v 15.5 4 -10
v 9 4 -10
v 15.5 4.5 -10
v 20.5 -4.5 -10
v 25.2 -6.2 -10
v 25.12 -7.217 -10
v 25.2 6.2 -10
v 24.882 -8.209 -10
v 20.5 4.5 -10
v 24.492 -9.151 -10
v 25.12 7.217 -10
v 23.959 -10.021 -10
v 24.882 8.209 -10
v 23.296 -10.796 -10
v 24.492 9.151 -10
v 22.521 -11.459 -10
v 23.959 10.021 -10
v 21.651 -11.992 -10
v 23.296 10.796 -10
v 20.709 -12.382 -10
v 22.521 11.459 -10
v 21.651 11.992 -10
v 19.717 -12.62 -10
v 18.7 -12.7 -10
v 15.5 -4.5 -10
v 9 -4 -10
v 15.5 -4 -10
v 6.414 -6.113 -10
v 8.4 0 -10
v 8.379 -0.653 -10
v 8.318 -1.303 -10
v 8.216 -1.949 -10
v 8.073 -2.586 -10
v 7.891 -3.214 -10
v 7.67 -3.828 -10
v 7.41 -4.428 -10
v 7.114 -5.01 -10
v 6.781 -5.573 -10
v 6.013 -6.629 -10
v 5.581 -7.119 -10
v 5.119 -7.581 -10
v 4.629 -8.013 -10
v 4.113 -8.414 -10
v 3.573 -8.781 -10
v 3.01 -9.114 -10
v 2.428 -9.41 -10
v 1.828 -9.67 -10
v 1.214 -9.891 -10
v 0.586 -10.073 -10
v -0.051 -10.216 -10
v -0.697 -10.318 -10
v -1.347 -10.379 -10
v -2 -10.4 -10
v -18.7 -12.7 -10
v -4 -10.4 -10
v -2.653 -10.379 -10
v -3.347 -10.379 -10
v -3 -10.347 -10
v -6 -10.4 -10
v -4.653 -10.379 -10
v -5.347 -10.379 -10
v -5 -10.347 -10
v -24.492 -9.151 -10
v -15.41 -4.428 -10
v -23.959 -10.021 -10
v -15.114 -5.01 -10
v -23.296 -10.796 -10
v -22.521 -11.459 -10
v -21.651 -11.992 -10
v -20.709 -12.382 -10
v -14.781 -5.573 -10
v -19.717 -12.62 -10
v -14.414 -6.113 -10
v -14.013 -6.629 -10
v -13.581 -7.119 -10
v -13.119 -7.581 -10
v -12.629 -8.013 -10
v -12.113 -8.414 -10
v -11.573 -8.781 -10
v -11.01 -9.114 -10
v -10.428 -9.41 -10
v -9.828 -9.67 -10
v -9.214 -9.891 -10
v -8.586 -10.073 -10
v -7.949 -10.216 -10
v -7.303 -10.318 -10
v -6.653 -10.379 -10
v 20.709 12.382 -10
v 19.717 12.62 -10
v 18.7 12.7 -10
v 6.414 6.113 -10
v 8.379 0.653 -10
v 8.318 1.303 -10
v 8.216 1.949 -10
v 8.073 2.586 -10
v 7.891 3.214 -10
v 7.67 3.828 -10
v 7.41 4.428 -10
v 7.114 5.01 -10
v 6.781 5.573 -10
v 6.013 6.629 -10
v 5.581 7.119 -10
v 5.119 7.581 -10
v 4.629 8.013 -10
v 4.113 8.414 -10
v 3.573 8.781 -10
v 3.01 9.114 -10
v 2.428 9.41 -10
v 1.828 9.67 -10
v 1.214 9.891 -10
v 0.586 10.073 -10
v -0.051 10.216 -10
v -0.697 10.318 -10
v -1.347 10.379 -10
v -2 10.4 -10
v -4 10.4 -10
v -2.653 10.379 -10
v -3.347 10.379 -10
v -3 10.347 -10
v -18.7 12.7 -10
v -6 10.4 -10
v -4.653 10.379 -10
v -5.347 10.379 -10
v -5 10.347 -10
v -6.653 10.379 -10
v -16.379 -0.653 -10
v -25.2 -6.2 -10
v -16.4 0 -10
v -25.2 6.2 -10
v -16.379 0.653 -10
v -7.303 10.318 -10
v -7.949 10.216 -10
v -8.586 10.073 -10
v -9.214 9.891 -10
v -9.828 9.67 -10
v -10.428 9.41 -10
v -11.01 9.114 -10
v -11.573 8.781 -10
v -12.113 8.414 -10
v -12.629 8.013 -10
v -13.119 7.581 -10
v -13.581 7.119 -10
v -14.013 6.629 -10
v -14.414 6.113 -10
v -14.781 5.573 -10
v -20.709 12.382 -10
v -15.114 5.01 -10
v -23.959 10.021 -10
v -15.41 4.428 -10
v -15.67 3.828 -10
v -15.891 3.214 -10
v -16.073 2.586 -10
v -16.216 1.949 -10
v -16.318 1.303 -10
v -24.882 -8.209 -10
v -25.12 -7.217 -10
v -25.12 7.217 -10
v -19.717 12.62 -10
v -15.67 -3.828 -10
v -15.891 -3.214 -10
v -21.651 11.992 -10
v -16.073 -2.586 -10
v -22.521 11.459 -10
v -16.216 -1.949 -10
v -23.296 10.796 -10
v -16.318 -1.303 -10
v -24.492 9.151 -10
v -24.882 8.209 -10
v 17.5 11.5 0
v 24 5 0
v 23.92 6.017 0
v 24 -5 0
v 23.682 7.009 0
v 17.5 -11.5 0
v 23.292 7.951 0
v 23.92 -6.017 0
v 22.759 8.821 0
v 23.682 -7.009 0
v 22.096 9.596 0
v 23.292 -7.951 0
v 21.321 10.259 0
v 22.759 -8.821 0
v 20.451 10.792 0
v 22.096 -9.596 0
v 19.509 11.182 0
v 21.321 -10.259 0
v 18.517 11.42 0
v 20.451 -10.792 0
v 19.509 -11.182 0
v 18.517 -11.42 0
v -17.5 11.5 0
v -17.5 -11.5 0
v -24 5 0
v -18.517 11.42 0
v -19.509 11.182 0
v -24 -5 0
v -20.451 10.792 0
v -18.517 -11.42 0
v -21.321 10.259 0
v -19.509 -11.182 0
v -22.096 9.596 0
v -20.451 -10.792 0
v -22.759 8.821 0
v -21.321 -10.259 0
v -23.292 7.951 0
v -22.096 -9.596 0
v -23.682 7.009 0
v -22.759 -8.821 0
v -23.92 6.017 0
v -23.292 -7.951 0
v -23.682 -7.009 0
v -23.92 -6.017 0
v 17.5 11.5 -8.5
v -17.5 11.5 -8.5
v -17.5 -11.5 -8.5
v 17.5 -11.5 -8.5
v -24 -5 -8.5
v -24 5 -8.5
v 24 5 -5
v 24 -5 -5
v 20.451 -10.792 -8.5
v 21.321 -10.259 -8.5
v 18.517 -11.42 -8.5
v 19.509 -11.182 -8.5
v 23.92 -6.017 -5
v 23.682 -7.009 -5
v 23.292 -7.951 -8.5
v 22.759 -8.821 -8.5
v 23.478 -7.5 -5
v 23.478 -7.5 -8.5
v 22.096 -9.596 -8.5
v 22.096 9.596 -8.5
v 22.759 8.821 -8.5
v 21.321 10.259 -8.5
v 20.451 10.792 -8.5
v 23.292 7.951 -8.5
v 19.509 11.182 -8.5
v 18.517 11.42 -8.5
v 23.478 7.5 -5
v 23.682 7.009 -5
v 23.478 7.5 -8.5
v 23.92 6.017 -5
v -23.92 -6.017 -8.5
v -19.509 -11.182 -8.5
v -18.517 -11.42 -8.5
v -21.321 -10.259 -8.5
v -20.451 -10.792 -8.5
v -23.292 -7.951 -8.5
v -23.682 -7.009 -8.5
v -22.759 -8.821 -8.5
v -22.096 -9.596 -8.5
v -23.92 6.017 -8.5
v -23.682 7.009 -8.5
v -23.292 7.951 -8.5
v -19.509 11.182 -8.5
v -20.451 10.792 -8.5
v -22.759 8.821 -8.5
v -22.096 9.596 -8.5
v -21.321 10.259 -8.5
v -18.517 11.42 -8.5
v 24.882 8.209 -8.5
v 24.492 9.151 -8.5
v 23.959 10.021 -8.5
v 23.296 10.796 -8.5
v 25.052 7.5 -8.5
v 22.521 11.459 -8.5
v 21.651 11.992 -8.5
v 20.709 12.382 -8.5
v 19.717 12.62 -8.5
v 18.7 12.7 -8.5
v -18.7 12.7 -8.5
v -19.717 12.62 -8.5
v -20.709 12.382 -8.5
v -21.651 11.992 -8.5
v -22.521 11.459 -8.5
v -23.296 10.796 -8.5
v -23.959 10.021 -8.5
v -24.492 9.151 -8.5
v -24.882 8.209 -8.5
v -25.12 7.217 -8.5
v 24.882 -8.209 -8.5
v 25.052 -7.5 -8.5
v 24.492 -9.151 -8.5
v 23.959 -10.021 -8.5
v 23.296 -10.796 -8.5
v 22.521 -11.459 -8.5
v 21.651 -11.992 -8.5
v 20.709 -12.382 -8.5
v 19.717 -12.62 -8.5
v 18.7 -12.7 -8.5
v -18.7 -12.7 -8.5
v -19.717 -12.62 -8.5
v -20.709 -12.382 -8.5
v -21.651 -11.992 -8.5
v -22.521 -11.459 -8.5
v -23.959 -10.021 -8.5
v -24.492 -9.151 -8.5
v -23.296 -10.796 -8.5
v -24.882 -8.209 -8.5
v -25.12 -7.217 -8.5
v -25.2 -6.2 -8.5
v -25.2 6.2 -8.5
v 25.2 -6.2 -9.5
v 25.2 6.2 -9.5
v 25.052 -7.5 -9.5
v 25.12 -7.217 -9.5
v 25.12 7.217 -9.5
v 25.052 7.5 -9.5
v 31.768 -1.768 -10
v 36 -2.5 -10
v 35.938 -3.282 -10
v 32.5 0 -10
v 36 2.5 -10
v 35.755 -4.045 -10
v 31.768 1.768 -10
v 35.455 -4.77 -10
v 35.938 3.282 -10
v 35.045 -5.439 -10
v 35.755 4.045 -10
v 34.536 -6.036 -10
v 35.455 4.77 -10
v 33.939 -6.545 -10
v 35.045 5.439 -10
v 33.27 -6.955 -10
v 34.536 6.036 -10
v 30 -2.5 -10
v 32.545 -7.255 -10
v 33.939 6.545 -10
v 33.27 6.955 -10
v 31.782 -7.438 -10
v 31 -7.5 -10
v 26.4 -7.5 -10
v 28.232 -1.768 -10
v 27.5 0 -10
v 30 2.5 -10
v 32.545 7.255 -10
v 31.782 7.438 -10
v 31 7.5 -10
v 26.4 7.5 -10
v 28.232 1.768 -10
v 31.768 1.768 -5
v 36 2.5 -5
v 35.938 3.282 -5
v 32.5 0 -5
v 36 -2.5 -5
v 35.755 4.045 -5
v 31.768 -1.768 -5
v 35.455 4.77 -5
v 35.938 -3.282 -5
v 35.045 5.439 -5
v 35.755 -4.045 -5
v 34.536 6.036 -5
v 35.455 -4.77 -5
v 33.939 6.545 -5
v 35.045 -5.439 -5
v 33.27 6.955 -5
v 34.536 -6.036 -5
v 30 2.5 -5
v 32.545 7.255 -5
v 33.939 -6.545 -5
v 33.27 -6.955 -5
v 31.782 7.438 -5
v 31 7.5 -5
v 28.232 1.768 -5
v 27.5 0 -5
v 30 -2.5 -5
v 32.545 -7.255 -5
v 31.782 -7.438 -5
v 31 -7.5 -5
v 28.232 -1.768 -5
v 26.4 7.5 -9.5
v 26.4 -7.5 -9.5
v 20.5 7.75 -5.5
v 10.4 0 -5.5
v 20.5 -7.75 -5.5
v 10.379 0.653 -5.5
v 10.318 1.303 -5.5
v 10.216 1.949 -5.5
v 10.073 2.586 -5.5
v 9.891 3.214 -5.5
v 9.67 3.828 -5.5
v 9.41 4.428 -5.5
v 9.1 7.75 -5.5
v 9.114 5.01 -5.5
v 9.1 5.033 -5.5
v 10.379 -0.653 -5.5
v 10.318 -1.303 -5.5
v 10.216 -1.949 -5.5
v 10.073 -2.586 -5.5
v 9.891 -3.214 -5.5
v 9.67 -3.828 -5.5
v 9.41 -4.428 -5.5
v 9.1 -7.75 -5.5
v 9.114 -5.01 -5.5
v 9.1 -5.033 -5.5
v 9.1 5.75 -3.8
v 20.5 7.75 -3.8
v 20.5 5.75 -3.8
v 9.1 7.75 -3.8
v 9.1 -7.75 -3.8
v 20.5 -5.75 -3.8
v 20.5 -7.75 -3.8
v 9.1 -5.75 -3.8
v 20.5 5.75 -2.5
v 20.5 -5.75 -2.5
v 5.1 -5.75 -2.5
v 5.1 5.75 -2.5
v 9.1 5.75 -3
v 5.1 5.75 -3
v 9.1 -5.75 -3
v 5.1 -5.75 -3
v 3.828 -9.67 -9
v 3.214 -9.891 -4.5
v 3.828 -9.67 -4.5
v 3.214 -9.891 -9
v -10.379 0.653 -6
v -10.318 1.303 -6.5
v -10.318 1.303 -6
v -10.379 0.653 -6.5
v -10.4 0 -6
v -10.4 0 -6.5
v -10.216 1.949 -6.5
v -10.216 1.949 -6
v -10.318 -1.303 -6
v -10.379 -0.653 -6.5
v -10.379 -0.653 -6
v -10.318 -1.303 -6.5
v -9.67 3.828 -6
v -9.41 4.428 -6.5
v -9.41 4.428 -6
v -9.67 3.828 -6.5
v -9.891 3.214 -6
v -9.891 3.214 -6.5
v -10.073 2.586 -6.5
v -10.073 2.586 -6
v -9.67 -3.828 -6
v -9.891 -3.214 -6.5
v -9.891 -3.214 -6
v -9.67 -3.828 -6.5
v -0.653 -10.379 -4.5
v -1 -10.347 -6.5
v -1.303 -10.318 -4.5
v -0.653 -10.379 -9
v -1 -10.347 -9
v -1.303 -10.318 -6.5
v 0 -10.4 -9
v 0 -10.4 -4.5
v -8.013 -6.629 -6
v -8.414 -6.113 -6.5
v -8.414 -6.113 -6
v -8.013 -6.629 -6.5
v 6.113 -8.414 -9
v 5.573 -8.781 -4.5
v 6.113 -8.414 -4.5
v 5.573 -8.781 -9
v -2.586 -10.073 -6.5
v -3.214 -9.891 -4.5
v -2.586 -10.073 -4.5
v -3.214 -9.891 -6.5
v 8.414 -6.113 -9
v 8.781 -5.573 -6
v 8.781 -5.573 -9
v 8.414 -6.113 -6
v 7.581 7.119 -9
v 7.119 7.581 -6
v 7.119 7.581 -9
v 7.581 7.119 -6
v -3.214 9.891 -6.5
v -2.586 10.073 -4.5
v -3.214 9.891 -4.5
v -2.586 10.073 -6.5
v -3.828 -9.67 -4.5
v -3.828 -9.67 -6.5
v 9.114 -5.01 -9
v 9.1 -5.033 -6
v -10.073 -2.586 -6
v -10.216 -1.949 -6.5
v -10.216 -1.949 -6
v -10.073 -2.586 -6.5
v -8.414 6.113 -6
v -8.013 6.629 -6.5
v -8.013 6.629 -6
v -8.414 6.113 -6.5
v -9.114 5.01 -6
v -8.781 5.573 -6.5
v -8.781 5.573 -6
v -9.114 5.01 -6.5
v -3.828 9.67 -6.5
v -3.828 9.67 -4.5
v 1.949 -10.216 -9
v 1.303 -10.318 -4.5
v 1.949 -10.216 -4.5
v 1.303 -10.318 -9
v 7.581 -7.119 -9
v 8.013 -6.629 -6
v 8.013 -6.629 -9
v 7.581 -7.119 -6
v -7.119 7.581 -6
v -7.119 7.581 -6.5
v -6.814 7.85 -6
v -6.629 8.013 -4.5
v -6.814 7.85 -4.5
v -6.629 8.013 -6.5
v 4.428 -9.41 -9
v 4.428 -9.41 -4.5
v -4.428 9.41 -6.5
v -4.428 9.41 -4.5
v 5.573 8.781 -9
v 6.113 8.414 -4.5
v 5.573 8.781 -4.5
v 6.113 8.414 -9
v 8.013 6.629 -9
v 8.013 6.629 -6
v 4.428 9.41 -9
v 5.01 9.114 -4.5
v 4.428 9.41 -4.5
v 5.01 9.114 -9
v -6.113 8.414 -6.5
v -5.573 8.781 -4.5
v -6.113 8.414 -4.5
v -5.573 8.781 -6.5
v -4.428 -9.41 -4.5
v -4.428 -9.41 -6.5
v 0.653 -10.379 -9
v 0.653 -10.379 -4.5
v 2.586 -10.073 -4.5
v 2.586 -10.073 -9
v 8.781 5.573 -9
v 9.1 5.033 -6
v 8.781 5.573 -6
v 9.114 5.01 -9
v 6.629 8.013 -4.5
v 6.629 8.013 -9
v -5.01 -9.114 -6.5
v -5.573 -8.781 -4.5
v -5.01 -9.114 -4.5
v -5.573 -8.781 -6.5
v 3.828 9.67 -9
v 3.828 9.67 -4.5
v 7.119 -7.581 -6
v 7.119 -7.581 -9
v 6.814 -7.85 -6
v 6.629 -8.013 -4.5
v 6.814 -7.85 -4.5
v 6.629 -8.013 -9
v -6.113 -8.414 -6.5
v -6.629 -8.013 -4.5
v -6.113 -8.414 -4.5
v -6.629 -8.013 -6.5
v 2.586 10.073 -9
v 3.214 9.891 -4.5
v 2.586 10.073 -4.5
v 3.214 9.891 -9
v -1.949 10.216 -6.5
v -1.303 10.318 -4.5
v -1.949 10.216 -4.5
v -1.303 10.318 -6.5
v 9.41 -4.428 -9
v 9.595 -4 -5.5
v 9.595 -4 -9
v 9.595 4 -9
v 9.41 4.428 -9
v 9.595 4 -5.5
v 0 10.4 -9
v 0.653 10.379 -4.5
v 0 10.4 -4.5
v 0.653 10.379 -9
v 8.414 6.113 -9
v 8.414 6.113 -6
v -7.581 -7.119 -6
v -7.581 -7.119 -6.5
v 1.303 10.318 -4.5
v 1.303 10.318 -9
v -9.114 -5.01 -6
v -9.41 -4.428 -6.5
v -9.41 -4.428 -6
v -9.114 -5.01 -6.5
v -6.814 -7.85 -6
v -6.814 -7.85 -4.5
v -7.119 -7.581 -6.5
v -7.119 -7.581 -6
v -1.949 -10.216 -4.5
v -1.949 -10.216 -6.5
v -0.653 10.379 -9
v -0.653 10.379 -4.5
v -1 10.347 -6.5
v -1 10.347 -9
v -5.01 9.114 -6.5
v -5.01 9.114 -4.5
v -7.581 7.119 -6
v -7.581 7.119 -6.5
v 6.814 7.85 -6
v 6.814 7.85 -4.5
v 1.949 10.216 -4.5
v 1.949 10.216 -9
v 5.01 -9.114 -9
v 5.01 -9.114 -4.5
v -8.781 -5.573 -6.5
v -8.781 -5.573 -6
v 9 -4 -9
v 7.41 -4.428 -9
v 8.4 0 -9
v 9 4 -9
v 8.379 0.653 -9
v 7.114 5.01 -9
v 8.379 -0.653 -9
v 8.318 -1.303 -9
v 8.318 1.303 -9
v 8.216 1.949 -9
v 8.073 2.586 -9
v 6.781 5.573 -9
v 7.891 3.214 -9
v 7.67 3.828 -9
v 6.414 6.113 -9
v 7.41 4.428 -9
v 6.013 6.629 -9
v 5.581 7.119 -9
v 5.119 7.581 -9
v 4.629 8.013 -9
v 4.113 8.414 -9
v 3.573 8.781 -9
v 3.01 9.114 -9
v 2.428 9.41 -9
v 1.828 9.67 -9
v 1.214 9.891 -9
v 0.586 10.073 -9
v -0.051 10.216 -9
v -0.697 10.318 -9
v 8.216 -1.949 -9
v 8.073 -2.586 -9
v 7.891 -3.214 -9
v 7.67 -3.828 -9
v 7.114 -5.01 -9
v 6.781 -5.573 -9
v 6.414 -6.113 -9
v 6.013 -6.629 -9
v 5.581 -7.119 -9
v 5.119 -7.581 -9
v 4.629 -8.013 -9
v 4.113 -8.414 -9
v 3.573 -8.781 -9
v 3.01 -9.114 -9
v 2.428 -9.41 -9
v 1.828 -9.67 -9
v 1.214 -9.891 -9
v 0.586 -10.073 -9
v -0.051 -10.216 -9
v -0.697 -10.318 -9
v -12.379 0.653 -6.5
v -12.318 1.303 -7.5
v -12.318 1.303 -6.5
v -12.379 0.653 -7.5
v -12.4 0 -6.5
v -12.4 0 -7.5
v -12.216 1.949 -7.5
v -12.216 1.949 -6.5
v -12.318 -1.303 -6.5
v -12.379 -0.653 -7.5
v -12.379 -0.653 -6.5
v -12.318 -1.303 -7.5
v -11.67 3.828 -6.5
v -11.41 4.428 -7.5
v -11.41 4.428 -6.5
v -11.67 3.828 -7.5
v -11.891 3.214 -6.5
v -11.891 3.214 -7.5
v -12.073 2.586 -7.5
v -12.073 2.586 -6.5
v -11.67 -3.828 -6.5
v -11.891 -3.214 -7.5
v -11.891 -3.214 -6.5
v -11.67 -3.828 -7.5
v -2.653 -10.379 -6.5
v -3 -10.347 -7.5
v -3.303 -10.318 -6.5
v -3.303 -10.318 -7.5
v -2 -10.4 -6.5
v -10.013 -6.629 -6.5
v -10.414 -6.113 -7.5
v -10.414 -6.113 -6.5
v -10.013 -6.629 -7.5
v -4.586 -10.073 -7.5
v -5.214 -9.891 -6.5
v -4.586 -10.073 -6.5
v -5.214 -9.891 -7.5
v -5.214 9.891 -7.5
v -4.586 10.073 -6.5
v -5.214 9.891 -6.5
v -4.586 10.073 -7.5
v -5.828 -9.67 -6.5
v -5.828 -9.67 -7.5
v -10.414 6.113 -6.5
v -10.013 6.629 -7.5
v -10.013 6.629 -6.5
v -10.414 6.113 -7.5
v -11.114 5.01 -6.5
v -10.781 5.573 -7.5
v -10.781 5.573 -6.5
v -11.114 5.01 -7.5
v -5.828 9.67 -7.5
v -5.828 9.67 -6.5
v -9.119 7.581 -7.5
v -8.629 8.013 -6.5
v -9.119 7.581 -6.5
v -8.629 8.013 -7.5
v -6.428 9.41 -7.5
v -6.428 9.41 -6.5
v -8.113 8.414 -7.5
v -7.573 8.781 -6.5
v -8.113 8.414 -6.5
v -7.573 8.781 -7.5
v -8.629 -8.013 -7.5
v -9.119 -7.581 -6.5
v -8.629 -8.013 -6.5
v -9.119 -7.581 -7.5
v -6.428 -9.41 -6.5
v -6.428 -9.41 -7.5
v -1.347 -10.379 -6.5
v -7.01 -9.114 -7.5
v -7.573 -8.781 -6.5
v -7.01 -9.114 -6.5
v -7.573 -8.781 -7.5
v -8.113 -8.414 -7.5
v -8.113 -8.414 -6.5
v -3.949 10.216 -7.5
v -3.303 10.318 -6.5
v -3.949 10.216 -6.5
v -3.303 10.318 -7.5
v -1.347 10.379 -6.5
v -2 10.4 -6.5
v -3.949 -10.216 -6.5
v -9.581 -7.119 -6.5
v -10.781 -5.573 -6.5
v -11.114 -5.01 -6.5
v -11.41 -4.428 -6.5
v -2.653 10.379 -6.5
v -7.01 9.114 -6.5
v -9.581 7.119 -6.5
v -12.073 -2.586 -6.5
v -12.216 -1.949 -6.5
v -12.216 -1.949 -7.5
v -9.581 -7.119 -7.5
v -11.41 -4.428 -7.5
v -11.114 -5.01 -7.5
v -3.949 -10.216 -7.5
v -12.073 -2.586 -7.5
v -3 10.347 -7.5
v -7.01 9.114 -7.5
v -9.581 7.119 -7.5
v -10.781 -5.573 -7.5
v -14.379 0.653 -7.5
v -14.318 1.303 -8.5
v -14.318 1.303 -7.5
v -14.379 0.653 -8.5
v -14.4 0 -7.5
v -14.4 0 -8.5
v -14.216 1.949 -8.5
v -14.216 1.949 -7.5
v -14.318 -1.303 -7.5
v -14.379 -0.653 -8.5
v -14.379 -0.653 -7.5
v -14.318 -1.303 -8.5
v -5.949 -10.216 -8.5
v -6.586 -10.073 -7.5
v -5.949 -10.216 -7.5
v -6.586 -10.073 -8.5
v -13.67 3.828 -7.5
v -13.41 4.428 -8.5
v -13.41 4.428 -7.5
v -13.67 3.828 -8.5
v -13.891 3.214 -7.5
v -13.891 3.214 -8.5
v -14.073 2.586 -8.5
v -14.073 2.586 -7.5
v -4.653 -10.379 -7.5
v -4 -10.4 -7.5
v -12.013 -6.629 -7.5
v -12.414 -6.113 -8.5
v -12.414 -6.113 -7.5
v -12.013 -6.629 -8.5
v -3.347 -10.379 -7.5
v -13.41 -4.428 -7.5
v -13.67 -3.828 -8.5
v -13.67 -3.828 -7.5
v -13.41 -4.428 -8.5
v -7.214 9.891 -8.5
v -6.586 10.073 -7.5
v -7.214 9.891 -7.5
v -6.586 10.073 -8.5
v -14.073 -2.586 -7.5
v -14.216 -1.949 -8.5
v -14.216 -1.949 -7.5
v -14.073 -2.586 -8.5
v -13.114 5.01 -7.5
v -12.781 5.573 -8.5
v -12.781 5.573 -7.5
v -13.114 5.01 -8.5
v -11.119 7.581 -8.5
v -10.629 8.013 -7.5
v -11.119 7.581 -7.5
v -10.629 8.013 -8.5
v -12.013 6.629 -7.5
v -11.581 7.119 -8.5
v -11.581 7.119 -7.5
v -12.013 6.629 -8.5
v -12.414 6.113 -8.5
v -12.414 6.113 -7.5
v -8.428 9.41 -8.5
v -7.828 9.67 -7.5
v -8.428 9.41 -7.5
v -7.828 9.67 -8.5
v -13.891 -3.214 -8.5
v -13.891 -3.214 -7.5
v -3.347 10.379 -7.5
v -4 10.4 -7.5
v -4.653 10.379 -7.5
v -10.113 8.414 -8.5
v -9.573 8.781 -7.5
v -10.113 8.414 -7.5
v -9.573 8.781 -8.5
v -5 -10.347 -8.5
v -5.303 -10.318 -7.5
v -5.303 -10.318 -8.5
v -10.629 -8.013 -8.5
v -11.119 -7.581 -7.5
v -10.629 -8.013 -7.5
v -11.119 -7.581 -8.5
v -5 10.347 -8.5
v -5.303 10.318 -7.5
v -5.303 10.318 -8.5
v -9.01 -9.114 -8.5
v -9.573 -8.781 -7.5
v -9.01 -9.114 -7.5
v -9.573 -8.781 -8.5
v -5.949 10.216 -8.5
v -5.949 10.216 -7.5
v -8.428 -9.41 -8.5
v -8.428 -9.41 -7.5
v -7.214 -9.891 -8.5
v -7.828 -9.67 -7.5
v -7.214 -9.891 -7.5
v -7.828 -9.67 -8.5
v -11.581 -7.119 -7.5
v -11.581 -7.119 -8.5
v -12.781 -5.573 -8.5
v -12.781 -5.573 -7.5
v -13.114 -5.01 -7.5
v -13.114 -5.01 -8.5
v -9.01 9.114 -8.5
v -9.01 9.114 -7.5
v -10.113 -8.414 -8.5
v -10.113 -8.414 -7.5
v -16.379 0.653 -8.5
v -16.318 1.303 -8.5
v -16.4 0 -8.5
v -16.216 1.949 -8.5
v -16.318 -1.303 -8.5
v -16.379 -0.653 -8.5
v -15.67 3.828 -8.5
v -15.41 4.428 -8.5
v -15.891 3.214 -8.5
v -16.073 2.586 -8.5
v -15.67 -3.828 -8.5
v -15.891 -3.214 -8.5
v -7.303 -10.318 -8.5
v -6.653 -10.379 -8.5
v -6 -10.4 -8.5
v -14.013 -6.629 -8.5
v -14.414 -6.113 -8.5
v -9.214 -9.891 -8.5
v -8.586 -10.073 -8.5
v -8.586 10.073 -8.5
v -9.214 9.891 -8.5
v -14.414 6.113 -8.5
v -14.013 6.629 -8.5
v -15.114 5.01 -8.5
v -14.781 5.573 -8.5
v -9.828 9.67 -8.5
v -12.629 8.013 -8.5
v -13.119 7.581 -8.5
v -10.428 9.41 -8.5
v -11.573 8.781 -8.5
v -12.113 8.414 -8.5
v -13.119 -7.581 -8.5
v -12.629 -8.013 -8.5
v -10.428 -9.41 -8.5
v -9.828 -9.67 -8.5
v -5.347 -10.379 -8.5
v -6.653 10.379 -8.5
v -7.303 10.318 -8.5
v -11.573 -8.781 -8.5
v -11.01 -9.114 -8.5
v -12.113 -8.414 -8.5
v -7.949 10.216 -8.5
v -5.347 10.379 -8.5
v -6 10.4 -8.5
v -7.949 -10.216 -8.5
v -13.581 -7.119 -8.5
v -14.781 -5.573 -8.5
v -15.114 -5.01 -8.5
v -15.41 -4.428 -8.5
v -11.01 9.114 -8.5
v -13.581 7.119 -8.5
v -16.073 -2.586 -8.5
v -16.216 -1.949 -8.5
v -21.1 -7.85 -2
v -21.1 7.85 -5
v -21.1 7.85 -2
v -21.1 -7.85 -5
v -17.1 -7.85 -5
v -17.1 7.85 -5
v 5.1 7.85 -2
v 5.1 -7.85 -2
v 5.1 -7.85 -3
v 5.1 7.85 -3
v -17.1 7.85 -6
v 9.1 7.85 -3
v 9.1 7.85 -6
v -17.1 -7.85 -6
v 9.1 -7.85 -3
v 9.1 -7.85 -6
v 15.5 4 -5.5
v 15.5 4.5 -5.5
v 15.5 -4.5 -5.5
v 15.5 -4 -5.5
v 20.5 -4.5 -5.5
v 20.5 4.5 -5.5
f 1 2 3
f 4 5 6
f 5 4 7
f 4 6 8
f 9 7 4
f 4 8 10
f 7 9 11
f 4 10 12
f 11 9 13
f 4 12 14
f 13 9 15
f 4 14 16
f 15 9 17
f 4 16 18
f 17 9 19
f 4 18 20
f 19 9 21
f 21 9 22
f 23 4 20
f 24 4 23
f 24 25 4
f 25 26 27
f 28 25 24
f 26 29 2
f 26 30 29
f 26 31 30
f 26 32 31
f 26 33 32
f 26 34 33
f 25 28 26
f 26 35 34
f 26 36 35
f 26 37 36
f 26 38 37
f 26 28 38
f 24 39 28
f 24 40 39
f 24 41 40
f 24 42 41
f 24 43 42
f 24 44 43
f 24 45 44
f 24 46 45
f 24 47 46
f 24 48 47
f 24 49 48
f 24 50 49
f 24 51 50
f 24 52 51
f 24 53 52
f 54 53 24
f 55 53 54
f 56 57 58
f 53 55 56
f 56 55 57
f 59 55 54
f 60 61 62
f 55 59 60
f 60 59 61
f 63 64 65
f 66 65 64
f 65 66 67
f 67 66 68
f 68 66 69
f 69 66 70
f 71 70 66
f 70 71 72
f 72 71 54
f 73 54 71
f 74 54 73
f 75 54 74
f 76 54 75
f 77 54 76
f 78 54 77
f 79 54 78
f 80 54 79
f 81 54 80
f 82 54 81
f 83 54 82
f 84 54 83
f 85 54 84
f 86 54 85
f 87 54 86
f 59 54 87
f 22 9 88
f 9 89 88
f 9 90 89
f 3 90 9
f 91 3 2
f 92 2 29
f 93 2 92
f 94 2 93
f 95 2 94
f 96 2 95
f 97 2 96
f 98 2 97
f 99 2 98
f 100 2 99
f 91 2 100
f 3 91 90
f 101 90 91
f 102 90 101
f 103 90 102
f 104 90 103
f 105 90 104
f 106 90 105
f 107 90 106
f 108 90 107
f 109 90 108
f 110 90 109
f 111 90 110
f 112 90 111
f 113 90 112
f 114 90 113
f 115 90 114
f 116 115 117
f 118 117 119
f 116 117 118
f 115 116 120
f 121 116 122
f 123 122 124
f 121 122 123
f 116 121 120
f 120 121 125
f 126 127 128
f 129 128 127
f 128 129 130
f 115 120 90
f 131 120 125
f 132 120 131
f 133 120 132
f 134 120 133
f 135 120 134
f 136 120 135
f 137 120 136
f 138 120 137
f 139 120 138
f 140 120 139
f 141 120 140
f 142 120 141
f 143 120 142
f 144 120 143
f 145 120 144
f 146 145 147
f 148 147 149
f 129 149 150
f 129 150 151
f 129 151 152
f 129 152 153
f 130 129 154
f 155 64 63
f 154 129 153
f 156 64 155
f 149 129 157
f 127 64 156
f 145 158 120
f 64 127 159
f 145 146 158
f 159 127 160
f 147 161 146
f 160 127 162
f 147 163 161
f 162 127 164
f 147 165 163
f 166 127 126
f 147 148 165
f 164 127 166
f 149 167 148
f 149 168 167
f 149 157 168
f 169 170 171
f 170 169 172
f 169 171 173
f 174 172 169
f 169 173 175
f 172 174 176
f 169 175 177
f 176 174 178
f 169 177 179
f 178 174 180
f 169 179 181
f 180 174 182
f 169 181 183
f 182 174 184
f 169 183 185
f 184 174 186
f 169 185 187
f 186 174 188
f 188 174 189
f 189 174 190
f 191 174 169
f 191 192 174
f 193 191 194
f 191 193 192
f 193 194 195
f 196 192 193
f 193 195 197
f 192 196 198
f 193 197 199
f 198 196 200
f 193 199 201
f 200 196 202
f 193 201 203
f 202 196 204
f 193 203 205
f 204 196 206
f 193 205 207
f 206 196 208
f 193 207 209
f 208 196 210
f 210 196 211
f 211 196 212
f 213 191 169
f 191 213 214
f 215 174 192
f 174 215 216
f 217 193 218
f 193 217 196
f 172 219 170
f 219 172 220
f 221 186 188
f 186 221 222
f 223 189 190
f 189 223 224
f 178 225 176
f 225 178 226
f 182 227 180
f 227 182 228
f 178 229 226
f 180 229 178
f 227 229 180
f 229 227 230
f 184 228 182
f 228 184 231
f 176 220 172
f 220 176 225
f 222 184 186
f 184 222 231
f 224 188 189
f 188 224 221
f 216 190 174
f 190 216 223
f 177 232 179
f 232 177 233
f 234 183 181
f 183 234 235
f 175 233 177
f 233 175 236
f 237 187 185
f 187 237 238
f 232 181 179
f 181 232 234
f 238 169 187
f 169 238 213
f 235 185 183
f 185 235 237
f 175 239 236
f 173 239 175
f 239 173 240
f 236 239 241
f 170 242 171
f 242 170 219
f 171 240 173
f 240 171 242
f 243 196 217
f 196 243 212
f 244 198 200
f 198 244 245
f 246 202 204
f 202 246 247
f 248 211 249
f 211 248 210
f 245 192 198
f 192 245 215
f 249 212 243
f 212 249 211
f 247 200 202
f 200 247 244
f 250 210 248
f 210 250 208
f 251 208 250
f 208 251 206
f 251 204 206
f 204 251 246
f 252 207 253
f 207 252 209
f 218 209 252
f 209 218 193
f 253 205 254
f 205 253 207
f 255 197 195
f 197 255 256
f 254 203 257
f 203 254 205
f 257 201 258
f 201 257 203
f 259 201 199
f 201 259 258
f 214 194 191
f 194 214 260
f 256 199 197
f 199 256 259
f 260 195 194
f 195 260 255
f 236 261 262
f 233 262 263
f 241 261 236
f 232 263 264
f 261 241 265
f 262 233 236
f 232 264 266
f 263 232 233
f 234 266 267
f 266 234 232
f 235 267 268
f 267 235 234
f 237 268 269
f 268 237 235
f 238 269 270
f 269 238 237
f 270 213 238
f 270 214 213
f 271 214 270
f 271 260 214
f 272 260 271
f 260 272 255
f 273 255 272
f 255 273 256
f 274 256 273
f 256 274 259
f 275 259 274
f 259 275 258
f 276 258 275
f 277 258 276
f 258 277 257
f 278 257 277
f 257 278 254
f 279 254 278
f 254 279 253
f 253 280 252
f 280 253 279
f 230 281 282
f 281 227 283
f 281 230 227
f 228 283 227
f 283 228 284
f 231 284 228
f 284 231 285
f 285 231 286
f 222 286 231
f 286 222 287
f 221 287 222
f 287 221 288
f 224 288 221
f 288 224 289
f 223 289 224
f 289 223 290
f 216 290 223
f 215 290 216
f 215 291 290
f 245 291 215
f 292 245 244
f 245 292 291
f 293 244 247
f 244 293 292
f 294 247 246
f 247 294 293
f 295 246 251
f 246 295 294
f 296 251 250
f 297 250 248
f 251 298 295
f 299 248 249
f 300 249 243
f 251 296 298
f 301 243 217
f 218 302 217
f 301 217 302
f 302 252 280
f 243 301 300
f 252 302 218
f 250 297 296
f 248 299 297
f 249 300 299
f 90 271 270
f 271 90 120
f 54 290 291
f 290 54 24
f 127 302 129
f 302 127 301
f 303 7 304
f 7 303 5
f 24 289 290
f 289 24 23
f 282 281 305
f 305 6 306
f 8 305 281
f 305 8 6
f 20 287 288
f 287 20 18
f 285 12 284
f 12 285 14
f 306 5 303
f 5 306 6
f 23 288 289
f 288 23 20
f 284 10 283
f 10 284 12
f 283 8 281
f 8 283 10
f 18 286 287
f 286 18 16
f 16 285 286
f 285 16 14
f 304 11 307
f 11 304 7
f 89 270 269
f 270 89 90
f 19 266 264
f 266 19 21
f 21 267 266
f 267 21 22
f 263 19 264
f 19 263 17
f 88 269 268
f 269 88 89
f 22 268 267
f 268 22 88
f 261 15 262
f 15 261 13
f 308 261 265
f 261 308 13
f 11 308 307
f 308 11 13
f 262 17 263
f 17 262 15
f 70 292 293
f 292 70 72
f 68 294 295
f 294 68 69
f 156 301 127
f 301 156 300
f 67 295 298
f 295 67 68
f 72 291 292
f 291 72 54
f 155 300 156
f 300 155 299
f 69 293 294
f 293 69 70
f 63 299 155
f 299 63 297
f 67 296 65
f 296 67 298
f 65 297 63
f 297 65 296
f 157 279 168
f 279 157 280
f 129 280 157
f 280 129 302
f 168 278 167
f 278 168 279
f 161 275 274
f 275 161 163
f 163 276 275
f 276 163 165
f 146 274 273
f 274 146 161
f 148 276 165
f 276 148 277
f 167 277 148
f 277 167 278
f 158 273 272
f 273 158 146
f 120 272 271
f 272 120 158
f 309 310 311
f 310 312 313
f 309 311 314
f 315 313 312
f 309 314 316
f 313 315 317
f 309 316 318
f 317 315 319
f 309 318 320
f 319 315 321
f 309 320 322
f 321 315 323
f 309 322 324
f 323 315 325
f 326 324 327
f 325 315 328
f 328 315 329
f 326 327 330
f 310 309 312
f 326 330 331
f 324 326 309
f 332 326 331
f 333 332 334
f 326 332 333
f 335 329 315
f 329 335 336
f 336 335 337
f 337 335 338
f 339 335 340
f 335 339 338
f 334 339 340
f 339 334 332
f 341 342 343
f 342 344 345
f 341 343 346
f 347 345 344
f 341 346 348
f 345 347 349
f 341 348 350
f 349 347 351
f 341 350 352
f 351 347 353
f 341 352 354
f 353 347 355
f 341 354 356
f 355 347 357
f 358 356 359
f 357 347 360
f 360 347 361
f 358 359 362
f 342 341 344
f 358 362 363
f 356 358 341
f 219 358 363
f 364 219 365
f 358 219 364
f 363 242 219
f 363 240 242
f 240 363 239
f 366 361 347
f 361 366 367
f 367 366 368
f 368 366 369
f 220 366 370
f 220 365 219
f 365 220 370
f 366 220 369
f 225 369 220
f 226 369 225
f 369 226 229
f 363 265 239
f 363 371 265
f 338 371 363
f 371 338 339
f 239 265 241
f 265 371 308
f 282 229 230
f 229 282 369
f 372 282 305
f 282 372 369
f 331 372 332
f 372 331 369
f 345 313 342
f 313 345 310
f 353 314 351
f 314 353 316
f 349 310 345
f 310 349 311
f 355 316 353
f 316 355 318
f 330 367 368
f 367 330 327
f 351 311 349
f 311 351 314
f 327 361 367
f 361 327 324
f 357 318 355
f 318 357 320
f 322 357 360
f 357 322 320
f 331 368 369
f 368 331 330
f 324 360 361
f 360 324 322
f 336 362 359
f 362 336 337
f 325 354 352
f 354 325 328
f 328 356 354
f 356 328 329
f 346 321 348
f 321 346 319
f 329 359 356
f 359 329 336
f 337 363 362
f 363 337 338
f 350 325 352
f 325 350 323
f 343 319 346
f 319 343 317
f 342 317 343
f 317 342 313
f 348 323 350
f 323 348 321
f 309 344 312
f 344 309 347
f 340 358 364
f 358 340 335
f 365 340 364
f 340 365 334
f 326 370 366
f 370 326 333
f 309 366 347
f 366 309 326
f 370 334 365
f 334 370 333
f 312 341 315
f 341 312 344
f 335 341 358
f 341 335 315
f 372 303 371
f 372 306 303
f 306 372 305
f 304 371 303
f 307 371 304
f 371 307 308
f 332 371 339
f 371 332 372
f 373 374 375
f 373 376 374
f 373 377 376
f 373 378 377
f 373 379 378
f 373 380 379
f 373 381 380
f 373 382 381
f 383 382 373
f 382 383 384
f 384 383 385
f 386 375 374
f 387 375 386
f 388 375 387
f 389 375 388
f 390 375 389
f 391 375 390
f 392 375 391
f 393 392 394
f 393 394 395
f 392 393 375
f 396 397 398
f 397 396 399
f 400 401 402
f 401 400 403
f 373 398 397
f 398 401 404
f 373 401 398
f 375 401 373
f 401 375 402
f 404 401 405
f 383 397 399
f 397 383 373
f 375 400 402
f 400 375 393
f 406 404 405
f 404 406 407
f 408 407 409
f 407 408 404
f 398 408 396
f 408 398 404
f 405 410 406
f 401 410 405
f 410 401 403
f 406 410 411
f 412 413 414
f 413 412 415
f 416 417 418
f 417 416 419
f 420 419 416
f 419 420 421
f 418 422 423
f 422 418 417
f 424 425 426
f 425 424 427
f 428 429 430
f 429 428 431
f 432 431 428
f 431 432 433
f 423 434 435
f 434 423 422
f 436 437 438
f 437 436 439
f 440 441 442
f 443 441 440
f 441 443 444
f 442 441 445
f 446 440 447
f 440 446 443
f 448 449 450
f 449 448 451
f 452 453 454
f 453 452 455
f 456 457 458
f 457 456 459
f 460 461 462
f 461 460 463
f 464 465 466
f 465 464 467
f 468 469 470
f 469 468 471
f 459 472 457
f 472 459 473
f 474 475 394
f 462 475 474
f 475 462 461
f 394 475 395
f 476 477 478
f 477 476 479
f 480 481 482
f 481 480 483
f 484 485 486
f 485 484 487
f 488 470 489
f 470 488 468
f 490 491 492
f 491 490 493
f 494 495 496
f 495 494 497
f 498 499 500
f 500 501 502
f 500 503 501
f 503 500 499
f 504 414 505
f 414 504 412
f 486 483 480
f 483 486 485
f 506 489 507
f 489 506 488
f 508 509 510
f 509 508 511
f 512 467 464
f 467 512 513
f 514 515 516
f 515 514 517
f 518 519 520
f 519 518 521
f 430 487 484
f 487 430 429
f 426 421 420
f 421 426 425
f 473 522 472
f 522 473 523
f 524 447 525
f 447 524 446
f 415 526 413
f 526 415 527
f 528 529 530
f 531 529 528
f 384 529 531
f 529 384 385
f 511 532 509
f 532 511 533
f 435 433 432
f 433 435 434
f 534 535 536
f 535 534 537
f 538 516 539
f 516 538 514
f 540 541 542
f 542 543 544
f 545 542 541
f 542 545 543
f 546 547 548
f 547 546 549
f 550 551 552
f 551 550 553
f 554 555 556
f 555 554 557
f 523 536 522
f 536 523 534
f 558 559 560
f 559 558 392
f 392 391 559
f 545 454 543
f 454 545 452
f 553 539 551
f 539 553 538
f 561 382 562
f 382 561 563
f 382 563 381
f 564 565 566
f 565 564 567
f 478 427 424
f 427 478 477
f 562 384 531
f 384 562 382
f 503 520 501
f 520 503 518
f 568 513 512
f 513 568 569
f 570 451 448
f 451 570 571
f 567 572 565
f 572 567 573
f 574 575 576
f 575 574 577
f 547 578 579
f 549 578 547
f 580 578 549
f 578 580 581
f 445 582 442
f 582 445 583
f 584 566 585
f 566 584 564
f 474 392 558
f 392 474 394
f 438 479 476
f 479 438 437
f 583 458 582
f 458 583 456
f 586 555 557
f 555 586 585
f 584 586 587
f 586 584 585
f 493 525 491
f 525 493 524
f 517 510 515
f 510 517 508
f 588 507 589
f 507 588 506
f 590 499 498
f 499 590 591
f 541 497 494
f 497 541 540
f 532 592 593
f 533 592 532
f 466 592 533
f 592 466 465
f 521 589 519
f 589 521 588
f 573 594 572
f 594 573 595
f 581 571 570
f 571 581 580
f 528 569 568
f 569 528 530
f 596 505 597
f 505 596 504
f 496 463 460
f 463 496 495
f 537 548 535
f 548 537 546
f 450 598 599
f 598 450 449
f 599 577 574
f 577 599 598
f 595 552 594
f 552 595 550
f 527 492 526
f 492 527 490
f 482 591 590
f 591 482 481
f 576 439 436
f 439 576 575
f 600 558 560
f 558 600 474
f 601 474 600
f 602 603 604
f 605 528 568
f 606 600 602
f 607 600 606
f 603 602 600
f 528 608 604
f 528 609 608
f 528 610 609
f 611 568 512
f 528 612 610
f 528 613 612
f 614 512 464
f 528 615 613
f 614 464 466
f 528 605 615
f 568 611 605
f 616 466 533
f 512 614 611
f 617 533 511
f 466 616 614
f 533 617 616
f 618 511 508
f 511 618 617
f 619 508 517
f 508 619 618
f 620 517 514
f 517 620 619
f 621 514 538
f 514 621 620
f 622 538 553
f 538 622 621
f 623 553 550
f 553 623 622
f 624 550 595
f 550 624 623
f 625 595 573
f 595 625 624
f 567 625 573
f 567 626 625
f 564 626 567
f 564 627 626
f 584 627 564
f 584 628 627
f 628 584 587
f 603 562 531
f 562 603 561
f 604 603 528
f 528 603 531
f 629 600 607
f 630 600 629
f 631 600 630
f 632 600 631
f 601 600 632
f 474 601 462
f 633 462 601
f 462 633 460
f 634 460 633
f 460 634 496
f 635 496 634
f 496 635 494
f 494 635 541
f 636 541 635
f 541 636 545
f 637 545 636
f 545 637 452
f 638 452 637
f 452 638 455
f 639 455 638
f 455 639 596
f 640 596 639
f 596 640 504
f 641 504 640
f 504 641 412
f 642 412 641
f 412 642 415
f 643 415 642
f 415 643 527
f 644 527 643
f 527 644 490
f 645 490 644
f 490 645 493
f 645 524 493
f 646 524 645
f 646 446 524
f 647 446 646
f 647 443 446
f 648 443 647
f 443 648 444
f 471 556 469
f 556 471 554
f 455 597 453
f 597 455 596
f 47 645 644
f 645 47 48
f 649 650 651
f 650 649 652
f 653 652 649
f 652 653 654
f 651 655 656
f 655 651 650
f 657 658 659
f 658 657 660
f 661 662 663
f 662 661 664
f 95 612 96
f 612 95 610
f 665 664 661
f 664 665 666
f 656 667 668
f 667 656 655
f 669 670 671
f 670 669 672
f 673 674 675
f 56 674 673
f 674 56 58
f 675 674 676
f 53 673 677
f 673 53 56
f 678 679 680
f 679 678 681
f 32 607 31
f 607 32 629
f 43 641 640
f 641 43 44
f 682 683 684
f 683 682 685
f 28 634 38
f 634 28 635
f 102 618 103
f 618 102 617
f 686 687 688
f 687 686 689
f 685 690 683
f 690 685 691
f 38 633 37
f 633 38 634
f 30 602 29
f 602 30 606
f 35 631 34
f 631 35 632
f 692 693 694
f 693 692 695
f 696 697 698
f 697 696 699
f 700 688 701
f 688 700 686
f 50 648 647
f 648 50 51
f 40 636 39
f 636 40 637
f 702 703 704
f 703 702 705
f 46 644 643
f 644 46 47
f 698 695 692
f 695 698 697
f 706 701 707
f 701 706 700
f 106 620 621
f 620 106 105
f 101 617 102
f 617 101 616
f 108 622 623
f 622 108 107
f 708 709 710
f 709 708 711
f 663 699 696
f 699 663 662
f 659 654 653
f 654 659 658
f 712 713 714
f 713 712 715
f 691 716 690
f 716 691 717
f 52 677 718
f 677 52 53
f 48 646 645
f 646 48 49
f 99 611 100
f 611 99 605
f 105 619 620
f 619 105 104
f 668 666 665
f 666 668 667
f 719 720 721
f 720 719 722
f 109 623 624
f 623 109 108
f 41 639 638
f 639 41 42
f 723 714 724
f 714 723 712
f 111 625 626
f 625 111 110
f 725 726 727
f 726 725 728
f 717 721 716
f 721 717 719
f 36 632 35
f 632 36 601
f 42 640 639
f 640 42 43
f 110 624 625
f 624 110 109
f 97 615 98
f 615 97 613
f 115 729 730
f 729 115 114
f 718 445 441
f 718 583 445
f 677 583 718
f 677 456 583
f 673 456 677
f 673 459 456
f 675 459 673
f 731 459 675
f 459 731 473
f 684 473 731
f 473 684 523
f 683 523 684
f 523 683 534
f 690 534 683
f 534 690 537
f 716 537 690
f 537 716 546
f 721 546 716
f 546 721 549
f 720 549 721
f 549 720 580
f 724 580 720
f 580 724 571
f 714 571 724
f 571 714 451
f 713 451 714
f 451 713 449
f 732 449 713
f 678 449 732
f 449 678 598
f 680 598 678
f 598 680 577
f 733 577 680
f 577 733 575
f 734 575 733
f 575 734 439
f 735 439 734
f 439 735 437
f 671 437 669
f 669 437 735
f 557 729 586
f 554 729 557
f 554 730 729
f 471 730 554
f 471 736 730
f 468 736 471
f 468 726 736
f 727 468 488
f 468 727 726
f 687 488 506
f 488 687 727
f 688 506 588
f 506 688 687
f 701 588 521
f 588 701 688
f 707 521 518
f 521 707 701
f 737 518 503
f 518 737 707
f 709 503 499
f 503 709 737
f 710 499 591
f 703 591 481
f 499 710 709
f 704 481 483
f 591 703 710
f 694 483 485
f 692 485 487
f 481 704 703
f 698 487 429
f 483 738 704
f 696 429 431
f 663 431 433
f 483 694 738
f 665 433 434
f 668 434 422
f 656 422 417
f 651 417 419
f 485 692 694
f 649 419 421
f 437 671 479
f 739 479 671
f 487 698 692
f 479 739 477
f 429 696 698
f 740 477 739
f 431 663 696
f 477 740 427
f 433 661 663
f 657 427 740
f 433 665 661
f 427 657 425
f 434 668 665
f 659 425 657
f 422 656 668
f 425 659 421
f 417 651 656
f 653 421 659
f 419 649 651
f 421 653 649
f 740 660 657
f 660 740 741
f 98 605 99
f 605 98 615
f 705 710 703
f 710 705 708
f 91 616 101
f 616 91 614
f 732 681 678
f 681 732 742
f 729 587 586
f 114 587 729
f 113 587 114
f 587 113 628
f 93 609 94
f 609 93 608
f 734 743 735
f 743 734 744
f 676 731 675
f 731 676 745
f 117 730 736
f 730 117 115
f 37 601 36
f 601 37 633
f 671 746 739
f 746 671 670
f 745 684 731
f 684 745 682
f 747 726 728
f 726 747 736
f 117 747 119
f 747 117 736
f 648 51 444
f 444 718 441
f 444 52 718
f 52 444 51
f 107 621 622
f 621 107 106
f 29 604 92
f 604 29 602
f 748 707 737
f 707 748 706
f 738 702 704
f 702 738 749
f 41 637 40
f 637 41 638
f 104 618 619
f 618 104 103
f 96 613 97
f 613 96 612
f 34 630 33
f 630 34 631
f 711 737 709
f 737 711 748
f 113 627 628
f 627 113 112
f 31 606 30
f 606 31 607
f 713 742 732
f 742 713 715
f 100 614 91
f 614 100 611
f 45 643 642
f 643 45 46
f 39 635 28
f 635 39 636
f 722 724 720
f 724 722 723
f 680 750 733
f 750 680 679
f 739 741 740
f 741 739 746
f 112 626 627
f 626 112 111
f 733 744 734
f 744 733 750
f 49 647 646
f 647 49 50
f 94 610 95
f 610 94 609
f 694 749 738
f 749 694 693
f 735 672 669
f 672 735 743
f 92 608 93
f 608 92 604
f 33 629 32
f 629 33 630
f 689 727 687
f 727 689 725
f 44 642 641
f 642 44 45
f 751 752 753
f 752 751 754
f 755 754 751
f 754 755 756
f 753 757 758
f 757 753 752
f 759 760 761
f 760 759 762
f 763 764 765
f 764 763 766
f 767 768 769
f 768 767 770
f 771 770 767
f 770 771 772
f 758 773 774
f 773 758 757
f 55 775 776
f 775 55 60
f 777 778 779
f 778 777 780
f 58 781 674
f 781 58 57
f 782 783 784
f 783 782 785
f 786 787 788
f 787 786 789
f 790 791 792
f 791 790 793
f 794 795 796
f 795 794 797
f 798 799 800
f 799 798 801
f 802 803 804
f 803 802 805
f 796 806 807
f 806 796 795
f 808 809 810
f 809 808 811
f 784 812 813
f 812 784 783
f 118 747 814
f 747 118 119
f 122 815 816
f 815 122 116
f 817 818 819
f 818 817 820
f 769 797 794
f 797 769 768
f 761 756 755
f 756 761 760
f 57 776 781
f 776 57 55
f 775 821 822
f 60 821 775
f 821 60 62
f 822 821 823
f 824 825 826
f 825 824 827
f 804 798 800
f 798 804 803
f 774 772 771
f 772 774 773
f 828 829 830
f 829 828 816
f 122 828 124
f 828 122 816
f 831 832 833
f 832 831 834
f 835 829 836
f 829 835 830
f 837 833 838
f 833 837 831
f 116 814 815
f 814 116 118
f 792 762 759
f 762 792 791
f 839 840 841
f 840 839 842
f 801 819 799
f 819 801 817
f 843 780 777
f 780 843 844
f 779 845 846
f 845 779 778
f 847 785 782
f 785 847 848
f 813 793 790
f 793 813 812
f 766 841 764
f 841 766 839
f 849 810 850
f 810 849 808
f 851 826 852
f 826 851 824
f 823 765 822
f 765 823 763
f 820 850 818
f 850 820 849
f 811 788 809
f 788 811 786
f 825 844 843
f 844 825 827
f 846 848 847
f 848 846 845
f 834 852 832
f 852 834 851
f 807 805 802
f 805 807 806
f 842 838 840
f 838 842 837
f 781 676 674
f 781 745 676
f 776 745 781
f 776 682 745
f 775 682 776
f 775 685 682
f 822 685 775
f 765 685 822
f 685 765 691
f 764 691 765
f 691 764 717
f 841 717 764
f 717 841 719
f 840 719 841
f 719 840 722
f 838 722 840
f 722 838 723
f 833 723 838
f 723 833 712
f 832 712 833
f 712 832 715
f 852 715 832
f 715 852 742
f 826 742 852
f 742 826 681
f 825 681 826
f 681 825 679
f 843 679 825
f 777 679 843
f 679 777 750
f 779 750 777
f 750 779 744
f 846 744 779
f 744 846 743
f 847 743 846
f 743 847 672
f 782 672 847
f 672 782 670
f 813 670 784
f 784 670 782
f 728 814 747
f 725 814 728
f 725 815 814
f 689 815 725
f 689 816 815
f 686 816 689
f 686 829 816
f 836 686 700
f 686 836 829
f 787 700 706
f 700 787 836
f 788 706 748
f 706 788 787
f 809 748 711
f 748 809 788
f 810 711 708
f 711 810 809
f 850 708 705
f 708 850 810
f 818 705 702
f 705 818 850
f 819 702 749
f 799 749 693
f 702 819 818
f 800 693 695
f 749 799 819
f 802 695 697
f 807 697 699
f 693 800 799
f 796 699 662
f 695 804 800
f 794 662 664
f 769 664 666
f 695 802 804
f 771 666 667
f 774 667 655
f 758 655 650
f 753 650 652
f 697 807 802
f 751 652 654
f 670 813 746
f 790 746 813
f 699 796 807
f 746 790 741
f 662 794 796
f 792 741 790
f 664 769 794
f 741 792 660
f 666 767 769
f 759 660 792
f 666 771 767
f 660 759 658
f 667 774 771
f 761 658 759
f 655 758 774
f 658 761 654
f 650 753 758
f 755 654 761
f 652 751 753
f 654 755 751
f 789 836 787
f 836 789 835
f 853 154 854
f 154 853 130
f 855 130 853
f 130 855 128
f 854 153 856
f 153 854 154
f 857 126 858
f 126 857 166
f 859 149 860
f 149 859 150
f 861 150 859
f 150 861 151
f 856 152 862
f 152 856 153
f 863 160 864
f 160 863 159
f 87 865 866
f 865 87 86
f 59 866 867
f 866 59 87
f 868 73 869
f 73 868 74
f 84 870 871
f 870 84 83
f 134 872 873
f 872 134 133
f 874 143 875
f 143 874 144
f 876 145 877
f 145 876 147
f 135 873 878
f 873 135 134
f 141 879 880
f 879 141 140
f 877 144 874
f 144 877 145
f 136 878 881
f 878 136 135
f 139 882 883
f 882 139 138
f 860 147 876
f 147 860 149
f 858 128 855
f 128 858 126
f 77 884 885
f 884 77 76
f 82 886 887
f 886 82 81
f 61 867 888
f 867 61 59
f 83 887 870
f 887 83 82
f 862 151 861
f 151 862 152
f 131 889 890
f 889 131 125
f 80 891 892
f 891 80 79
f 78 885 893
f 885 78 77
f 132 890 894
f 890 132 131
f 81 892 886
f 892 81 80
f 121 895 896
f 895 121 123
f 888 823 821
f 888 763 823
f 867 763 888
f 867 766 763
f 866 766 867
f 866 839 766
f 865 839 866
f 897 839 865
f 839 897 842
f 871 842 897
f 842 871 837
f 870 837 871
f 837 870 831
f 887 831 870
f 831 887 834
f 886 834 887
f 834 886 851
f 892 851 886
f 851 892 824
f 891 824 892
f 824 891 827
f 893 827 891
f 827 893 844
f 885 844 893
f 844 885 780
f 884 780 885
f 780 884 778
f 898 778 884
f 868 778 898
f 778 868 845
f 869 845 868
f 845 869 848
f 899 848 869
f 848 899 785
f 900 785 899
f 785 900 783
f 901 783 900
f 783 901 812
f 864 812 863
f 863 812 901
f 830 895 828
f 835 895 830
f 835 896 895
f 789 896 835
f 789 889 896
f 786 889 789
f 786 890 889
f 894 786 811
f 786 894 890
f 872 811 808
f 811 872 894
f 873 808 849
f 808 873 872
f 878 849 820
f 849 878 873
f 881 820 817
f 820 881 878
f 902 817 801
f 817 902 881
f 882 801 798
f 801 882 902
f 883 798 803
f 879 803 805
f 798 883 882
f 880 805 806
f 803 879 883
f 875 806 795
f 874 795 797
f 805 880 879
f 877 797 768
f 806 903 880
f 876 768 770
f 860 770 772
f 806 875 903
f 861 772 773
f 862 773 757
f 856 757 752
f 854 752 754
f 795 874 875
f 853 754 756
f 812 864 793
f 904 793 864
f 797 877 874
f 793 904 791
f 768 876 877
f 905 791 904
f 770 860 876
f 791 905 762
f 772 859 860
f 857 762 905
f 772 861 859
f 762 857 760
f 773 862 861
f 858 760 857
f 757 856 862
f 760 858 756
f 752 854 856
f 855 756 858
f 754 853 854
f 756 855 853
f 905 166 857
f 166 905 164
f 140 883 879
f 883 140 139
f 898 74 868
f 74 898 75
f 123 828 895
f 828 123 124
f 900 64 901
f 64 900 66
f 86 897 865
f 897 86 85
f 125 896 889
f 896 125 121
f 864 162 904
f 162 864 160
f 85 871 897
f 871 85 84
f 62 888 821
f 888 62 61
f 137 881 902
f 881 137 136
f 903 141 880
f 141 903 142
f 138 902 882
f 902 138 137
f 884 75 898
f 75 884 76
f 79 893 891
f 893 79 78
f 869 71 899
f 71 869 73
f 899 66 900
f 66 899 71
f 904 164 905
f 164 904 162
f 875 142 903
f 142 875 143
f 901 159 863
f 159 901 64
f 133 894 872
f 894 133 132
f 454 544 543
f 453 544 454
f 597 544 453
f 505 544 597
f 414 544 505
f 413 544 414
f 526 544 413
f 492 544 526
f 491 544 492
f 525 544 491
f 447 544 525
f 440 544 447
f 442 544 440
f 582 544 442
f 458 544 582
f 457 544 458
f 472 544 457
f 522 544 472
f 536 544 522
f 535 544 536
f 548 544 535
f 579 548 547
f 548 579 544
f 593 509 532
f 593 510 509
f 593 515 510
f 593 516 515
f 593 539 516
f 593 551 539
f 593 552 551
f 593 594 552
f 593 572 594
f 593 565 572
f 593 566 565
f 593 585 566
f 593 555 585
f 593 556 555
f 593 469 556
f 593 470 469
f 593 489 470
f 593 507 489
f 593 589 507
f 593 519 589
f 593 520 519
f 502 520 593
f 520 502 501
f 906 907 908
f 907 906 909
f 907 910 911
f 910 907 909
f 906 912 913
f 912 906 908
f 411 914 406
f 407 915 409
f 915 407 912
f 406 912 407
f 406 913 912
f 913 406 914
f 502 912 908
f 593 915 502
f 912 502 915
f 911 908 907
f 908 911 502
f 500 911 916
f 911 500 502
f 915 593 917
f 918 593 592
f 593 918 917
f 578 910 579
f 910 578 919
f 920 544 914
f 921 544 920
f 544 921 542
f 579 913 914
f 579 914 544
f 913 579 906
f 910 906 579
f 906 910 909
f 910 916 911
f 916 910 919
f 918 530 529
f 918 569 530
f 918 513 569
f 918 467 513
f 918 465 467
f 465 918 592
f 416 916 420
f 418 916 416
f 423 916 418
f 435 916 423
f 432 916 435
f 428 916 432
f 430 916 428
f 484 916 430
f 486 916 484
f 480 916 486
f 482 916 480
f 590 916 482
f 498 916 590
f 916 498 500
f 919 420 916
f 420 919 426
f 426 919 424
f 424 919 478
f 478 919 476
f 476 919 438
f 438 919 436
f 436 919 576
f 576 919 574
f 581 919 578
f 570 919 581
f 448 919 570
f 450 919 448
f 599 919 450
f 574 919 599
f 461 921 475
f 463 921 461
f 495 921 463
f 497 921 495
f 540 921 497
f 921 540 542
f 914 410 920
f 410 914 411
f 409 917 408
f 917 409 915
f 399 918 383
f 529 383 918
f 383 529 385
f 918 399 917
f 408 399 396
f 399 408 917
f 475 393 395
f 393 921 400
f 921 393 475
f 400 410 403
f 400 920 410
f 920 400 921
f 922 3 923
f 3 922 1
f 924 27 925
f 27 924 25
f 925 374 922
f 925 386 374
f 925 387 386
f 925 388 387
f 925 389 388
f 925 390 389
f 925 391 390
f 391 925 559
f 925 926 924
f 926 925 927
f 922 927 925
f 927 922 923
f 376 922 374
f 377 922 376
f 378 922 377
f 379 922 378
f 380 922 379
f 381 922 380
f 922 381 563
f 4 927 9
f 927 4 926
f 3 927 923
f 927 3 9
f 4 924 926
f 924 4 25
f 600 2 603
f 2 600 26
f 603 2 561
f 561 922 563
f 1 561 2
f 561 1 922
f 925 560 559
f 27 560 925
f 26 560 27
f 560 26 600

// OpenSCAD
module cr2032(dia=20, height=3.2, ax=0.8, zx=0.3) {
	cylinder(r=(dia + ax)/2, h=(height + zx), $fn=100);
	//cube([dia+ax, dia+ax, height + zx],center=true);
}

module hole(dia=0.8) {
	cylinder(r=dia/2, h=50, center=true);
}

module radrect(l, w, h, r) {
	translate([0,0,h/2]) 
		union() {
			cube([l-2*r, w, h],center=true);
			cube([l, w-2*r, h],center=true);
			translate([-(l/2-r),-(w/2-r),0]) 
				cylinder(r=r, h=h, $fn=40, center=true);
			translate([-(l/2-r),(w/2-r),0]) 
				cylinder(r=r, h=h, $fn=40, center=true);
			translate([(l/2-r),-(w/2-r),0]) 
				cylinder(r=r, h=h, $fn=40, center=true);
			translate([(l/2-r),(w/2-r),0]) 
				cylinder(r=r, h=h, $fn=40, center=true);
		}
}

module can(length = 48, width=23, height = 10, lid_height=1.5,
				tab_height=5) {
	radrect(length, width, height, 6.5);
	if (height > 5) {
	translate([0,0,height-lid_height])
		radrect(length + 2.4, width + 2.4, lid_height, 6.5);

	translate([0,0,height-tab_height])
	difference() {
		translate([-length/2, 0, 0])
			radrect(12*2,15,tab_height,5);
		union() {
			translate([-(length/2 + 6), 0, 0])
				cylinder(r=5/2, h=height);
			translate([-length/2 - 2.4, -width/2, tab_height-0.5])
				cube([2.4,width,0.5]);
		}
	}
}
}

module esp(length=25.2, width=14.7, height=3, a=1, az=0) {
	translate([0,0,(height+az)/2]) 
		cube([length+a, width+a, height+az],center=true);
}

module tact(length=9, width=5, height=3) {
	translate([0,0,height/2]) 
		cube([width, length, height], center=true);
}

module windowtact(height=3, extra=5) {
	tact(height=height+extra);
}

//hs = 1.5;
//if (false) 
//difference() {
//	cube([30,8,5],center=true);
//	union() {
//		cr2032();
//		translate([hs, hs, 0]) hole();
//		translate([hs, -hs, 0]) hole();
//		translate([-hs, hs, 0]) hole();
//		translate([-hs, -hs, 0]) hole();
//		
//		//top cavity
//	}
//}

module pcb(length=14+2,width=15.5,thick=1.7) {
	translate([0,0,thick/2])
			cube([length,width,thick], center=true);
	translate([0,0,-(3-thick)/2])
			cube([length,width-4,3-thick], center=true);

}

module windowled(l=8,w=4+4,h=10) {
	translate([0,0,h/2])
		cube([w,l,h],center=true);
}

base = 2;
top = 2;
esp_height = 3;
pcb_thick = 1.7;
pcb_shelf = base + esp_height + 0.5 - pcb_thick;
pcb_top = pcb_shelf + pcb_thick;

rotate([0,180,0])
difference() 
					{
	can(height = 10);
//	can(height=base);
//translate([0,0,10-top])
//	can(height=top);

	union() {

		translate([0,0,pcb_top])
			cr2032();
		translate([2,0,pcb_top+1])
			cr2032();
		translate([4,0,pcb_top+2])
			cr2032();
		translate([6,0,pcb_top+3])
			cr2032();
		translate([0,0,pcb_top-1])
			cr2032();
		

		translate([8,0,base]) esp();		
		translate([8 - 4,0,base + 1]) esp();		


//		translate([0,0,-2])
//			/*PCB*/ translate([-13.5,0,1])cube([14,15.5,2], center=true);
		translate([-13.5+1,0,pcb_shelf])
			pcb();	

		translate([-18,0,pcb_top]) windowtact();
		translate([-13,0,pcb_top]) windowled();	

	}
}
